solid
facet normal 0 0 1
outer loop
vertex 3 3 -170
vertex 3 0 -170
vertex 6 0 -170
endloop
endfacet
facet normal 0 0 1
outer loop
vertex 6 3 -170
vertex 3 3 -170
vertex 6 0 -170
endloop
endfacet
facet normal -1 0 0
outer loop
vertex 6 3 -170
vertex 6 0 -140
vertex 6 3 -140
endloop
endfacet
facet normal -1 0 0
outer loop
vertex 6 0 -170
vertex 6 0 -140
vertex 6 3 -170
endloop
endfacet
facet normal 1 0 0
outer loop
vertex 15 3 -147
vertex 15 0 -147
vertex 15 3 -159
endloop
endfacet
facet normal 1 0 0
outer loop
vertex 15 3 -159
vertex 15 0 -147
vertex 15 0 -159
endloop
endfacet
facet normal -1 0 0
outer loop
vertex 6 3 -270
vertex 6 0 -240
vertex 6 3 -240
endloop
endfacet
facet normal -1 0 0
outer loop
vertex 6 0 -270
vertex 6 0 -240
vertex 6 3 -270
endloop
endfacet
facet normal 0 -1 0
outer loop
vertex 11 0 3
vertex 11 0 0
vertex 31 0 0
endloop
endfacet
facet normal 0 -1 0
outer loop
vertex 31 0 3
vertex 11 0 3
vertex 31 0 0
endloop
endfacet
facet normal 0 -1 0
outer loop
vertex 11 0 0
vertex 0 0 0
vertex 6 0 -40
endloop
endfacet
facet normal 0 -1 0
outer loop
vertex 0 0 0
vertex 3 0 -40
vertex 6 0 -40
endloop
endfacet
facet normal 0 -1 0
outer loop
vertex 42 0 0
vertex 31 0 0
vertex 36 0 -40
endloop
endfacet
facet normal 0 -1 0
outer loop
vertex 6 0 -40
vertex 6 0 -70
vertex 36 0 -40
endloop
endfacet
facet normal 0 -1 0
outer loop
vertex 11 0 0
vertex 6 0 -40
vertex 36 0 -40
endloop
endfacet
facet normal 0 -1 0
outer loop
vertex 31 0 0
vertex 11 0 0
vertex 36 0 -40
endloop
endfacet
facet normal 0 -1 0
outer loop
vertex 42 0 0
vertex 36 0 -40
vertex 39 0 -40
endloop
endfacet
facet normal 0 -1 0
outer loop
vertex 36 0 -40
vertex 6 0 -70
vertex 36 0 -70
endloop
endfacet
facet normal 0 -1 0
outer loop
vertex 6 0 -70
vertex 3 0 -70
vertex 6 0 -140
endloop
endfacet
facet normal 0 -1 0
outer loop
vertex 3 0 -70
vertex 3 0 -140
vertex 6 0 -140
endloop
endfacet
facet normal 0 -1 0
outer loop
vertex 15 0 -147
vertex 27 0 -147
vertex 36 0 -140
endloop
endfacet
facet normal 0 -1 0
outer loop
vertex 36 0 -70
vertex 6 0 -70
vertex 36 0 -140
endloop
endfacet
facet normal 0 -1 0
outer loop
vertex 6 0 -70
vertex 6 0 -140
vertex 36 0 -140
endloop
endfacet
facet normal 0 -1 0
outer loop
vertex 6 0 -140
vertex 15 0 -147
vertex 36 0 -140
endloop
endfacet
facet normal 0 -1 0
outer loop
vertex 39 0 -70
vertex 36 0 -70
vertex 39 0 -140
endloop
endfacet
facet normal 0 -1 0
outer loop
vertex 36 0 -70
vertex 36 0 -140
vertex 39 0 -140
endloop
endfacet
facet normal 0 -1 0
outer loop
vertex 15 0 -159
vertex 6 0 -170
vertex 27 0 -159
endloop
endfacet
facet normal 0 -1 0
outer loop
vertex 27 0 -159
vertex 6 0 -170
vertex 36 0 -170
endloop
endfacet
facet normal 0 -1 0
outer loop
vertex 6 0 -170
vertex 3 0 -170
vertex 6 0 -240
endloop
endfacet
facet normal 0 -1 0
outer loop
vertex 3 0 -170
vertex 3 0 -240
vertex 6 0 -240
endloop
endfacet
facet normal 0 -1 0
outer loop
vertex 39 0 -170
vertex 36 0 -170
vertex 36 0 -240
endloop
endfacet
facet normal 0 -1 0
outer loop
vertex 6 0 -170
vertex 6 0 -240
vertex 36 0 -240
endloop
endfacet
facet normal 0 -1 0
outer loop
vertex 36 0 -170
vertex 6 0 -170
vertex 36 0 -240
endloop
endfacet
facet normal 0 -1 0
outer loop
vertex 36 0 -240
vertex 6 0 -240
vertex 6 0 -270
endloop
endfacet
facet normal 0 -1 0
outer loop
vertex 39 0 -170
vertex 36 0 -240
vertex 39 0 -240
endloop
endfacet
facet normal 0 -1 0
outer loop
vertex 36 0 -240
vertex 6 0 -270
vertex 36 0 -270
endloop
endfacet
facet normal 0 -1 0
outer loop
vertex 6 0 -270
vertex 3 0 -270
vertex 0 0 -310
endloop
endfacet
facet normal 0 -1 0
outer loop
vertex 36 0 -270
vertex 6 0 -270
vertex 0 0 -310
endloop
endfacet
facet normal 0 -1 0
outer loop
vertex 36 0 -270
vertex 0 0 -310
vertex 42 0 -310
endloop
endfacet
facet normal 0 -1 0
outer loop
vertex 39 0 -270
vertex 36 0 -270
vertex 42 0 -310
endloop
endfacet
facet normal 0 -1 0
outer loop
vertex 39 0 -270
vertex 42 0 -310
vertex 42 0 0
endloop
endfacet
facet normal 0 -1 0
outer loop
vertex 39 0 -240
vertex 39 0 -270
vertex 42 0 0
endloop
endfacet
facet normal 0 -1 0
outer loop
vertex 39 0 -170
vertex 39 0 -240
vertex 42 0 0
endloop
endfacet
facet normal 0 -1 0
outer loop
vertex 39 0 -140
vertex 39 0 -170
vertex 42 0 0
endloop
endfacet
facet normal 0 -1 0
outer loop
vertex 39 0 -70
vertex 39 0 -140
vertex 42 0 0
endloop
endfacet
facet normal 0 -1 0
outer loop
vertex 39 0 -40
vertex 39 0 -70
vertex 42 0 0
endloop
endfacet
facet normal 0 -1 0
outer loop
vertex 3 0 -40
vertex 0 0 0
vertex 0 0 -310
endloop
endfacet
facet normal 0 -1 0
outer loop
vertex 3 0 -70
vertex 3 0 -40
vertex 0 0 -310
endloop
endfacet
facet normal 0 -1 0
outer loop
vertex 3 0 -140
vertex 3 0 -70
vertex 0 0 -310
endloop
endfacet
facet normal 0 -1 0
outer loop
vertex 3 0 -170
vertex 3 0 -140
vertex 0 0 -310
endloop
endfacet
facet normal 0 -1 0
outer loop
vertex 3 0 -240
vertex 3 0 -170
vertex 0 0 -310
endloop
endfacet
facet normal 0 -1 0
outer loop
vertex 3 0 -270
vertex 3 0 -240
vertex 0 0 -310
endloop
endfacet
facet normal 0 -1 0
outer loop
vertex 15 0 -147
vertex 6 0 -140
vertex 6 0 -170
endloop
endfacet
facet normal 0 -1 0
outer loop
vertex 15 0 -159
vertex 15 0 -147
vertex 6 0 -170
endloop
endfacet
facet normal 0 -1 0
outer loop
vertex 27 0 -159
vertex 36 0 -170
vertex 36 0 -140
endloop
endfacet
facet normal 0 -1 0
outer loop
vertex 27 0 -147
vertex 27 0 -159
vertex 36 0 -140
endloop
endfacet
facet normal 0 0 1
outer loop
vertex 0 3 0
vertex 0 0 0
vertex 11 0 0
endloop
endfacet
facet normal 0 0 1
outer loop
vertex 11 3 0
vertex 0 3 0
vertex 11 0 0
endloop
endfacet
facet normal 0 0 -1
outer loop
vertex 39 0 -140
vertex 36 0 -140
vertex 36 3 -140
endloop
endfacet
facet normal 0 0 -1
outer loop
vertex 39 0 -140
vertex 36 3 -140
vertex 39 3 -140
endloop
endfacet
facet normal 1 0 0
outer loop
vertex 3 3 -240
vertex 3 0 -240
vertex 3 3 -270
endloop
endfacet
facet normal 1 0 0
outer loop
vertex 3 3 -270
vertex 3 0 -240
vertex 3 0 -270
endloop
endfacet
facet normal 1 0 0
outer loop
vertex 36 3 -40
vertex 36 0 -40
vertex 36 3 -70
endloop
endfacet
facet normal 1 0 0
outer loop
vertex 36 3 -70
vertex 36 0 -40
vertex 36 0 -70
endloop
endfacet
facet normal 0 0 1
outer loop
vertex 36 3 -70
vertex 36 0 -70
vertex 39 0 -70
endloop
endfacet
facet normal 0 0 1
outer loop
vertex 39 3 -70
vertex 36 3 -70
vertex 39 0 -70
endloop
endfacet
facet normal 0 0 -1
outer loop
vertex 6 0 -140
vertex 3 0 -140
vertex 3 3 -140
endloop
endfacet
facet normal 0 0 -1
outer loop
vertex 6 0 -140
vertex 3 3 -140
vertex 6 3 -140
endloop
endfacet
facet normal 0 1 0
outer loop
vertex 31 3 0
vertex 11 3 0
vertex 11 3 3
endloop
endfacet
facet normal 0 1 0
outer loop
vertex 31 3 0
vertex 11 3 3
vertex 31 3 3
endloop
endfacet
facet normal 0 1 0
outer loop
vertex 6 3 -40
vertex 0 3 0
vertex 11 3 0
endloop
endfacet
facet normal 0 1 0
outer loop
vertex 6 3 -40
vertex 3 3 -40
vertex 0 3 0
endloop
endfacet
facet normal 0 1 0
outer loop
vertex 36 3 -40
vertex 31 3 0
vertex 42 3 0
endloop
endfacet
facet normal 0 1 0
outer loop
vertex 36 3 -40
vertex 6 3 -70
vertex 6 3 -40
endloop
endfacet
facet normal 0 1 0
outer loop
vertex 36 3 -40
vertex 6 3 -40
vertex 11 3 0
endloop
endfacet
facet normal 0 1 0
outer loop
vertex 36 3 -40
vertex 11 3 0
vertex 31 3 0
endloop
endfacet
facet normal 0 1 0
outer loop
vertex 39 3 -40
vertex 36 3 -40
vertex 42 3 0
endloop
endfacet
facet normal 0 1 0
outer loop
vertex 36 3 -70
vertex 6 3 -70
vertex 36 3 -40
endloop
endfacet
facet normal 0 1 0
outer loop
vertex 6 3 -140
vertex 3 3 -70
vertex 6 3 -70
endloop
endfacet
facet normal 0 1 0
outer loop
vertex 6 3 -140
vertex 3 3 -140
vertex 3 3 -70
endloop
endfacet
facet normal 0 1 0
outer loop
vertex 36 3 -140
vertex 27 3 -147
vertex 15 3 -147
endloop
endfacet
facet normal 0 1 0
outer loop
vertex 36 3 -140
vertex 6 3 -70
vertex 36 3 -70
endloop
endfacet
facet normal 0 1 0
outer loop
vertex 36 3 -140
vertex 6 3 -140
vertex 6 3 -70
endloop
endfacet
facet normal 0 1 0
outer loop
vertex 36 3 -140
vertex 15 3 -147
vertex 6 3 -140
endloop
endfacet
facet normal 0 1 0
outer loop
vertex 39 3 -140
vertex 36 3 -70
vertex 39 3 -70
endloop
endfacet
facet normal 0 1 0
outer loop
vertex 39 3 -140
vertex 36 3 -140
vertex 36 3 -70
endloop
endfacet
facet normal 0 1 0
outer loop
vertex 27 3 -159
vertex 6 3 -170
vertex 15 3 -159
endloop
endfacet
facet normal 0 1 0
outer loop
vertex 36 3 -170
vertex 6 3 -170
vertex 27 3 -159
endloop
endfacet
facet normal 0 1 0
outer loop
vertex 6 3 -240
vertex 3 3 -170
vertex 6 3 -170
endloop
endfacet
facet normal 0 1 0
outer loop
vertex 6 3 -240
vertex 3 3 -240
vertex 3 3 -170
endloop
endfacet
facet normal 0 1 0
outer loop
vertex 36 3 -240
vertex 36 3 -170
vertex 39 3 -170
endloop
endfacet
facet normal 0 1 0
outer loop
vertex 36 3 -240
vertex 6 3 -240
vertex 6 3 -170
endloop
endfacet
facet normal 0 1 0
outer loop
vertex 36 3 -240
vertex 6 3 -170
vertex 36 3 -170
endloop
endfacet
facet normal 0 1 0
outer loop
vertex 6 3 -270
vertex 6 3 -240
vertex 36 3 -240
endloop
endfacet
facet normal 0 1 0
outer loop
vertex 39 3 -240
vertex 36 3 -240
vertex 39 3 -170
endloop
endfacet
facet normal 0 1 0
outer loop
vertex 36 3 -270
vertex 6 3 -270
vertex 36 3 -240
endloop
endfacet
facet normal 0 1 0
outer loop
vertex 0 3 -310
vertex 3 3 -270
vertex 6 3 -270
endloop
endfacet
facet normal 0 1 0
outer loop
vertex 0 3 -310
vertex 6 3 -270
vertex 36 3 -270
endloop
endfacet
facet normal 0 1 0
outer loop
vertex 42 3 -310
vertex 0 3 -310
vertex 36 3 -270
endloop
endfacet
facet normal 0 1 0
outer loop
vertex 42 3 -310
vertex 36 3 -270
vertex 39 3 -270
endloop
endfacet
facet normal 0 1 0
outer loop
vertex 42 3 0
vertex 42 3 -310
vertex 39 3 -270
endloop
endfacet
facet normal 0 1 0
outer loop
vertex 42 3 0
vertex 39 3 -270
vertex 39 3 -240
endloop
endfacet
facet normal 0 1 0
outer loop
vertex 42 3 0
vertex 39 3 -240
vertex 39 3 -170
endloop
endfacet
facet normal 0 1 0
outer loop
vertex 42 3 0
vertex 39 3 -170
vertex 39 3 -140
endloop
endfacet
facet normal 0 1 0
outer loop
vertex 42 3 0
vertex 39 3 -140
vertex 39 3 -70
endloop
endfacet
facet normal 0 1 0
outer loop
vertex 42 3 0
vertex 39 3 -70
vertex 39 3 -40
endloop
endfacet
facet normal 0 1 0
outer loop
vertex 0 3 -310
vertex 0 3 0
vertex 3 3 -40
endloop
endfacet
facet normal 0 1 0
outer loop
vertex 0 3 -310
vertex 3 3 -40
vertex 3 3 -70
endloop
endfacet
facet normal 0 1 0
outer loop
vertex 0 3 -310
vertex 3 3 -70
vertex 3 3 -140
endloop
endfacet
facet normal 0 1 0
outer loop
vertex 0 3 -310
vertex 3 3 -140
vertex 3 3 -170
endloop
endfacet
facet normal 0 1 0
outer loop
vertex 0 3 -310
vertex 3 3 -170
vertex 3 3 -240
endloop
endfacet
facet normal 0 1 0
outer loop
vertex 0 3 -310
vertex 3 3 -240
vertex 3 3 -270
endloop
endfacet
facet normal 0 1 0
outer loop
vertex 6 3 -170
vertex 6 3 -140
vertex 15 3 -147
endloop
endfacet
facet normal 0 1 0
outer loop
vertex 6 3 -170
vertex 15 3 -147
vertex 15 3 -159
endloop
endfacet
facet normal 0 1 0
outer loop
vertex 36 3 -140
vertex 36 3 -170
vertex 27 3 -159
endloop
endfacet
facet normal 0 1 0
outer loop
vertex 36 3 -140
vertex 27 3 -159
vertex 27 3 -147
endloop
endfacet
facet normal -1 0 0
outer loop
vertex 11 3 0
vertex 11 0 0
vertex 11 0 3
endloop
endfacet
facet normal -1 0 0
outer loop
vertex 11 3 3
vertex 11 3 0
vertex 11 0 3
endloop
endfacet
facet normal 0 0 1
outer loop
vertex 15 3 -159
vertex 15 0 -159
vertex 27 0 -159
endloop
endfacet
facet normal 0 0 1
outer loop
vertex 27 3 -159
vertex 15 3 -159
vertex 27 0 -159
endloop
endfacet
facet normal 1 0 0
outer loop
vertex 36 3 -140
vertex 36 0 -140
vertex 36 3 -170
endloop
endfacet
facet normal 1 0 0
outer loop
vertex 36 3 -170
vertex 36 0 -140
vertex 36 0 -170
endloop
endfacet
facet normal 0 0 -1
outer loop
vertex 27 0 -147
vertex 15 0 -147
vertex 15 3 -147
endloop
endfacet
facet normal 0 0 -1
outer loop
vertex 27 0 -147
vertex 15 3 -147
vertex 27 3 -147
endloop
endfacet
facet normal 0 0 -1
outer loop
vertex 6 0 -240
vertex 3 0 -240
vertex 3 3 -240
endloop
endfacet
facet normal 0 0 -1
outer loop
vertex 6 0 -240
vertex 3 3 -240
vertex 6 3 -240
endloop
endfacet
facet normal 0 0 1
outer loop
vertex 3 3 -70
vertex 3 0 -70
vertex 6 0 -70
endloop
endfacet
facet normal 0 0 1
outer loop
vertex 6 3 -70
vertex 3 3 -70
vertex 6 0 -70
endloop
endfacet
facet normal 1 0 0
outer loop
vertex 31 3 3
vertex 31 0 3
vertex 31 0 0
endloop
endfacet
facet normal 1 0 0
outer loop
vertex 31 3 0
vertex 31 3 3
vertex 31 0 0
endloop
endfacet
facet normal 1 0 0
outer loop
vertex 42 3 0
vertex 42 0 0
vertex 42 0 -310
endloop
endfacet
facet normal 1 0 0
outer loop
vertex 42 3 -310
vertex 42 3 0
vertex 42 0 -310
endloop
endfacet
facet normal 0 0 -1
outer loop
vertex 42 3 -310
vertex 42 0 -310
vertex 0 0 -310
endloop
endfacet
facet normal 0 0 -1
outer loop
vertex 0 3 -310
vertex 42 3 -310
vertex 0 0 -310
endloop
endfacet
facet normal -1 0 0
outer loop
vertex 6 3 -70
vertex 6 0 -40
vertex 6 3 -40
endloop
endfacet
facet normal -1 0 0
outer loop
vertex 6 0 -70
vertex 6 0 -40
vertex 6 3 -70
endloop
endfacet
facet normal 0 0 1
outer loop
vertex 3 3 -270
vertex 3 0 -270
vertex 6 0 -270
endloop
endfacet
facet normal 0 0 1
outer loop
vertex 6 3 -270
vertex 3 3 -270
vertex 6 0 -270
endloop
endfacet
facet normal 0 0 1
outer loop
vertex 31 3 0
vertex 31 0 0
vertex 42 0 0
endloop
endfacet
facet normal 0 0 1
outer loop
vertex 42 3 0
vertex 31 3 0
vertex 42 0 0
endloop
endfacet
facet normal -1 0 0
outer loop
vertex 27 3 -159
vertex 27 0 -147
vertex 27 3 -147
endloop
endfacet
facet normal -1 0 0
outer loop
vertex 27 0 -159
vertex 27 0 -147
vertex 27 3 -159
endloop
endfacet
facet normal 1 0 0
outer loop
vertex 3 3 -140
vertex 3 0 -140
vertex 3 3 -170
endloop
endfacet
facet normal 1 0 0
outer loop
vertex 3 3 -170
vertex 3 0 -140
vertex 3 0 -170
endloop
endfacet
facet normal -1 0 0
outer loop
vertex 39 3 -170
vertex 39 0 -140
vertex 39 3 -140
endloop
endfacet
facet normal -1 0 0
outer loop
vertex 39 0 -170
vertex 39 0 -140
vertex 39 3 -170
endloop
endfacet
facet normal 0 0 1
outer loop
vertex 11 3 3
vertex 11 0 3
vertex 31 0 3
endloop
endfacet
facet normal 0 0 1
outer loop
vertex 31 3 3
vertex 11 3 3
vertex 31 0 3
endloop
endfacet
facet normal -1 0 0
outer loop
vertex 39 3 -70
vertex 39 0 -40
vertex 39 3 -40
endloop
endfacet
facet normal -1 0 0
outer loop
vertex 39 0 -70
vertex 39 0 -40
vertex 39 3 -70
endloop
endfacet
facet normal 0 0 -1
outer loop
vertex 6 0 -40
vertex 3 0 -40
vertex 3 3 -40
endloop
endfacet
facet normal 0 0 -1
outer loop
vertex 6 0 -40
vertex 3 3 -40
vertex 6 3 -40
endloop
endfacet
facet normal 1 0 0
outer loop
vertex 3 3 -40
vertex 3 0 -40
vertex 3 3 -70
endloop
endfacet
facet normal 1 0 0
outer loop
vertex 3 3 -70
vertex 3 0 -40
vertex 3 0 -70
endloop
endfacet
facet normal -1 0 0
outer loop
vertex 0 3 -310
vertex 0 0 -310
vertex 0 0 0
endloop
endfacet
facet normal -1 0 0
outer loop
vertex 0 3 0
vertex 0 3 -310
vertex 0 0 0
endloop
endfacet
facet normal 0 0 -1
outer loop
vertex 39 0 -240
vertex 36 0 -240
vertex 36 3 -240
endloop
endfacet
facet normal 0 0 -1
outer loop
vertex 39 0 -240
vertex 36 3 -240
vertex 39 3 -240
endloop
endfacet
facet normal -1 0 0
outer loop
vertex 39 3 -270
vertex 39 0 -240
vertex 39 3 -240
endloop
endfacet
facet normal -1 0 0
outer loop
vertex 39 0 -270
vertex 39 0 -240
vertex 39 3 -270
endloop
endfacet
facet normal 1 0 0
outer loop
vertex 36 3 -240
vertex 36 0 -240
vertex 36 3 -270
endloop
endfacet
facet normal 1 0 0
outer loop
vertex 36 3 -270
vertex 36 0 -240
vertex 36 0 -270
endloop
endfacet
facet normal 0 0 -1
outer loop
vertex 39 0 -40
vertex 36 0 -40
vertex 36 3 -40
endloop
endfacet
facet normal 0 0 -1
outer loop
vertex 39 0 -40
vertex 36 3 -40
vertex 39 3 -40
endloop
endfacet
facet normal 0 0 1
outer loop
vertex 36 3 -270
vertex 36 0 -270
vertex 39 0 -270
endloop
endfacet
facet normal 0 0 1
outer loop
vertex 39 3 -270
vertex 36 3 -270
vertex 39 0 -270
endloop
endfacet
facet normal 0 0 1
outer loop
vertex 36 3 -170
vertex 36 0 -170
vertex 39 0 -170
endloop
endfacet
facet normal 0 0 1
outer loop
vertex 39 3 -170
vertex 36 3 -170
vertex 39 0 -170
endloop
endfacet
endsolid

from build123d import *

# Parameters (mm, degrees)
SKETCH1_W           = 3
SKETCH1_H           = 30
SKETCH1_W_2         = 12
SKETCH1_H_2         = 12
BOSS_EXTRUDE1_DEPTH = 3


with BuildPart() as part:
    # Sketch1 → Boss-Extrude1 (new body)
    with BuildSketch(Plane(origin=(0, 0, 0), x_dir=(1, 0, 0), z_dir=(0, 1, 0))):
        Polygon((31, 0), (42, 0), (42, 310), (0, 310), (0, 0), (11, 0), (11, -3), (31, -3), align=None)
        with Locations((37.5, 55)):
            Rectangle(SKETCH1_W, SKETCH1_H, mode=Mode.SUBTRACT)
        with Locations((37.5, 155)):
            Rectangle(SKETCH1_W, SKETCH1_H, mode=Mode.SUBTRACT)
        with Locations((37.5, 255)):
            Rectangle(SKETCH1_W, SKETCH1_H, mode=Mode.SUBTRACT)
        with Locations((4.5, 255)):
            Rectangle(SKETCH1_W, SKETCH1_H, mode=Mode.SUBTRACT)
        with Locations((4.5, 155)):
            Rectangle(SKETCH1_W, SKETCH1_H, mode=Mode.SUBTRACT)
        with Locations((4.5, 55)):
            Rectangle(SKETCH1_W, SKETCH1_H, mode=Mode.SUBTRACT)
        with Locations((21, 153)):
            Rectangle(SKETCH1_W_2, SKETCH1_H_2, mode=Mode.SUBTRACT)
    extrude(amount=BOSS_EXTRUDE1_DEPTH)


solid = part.part
